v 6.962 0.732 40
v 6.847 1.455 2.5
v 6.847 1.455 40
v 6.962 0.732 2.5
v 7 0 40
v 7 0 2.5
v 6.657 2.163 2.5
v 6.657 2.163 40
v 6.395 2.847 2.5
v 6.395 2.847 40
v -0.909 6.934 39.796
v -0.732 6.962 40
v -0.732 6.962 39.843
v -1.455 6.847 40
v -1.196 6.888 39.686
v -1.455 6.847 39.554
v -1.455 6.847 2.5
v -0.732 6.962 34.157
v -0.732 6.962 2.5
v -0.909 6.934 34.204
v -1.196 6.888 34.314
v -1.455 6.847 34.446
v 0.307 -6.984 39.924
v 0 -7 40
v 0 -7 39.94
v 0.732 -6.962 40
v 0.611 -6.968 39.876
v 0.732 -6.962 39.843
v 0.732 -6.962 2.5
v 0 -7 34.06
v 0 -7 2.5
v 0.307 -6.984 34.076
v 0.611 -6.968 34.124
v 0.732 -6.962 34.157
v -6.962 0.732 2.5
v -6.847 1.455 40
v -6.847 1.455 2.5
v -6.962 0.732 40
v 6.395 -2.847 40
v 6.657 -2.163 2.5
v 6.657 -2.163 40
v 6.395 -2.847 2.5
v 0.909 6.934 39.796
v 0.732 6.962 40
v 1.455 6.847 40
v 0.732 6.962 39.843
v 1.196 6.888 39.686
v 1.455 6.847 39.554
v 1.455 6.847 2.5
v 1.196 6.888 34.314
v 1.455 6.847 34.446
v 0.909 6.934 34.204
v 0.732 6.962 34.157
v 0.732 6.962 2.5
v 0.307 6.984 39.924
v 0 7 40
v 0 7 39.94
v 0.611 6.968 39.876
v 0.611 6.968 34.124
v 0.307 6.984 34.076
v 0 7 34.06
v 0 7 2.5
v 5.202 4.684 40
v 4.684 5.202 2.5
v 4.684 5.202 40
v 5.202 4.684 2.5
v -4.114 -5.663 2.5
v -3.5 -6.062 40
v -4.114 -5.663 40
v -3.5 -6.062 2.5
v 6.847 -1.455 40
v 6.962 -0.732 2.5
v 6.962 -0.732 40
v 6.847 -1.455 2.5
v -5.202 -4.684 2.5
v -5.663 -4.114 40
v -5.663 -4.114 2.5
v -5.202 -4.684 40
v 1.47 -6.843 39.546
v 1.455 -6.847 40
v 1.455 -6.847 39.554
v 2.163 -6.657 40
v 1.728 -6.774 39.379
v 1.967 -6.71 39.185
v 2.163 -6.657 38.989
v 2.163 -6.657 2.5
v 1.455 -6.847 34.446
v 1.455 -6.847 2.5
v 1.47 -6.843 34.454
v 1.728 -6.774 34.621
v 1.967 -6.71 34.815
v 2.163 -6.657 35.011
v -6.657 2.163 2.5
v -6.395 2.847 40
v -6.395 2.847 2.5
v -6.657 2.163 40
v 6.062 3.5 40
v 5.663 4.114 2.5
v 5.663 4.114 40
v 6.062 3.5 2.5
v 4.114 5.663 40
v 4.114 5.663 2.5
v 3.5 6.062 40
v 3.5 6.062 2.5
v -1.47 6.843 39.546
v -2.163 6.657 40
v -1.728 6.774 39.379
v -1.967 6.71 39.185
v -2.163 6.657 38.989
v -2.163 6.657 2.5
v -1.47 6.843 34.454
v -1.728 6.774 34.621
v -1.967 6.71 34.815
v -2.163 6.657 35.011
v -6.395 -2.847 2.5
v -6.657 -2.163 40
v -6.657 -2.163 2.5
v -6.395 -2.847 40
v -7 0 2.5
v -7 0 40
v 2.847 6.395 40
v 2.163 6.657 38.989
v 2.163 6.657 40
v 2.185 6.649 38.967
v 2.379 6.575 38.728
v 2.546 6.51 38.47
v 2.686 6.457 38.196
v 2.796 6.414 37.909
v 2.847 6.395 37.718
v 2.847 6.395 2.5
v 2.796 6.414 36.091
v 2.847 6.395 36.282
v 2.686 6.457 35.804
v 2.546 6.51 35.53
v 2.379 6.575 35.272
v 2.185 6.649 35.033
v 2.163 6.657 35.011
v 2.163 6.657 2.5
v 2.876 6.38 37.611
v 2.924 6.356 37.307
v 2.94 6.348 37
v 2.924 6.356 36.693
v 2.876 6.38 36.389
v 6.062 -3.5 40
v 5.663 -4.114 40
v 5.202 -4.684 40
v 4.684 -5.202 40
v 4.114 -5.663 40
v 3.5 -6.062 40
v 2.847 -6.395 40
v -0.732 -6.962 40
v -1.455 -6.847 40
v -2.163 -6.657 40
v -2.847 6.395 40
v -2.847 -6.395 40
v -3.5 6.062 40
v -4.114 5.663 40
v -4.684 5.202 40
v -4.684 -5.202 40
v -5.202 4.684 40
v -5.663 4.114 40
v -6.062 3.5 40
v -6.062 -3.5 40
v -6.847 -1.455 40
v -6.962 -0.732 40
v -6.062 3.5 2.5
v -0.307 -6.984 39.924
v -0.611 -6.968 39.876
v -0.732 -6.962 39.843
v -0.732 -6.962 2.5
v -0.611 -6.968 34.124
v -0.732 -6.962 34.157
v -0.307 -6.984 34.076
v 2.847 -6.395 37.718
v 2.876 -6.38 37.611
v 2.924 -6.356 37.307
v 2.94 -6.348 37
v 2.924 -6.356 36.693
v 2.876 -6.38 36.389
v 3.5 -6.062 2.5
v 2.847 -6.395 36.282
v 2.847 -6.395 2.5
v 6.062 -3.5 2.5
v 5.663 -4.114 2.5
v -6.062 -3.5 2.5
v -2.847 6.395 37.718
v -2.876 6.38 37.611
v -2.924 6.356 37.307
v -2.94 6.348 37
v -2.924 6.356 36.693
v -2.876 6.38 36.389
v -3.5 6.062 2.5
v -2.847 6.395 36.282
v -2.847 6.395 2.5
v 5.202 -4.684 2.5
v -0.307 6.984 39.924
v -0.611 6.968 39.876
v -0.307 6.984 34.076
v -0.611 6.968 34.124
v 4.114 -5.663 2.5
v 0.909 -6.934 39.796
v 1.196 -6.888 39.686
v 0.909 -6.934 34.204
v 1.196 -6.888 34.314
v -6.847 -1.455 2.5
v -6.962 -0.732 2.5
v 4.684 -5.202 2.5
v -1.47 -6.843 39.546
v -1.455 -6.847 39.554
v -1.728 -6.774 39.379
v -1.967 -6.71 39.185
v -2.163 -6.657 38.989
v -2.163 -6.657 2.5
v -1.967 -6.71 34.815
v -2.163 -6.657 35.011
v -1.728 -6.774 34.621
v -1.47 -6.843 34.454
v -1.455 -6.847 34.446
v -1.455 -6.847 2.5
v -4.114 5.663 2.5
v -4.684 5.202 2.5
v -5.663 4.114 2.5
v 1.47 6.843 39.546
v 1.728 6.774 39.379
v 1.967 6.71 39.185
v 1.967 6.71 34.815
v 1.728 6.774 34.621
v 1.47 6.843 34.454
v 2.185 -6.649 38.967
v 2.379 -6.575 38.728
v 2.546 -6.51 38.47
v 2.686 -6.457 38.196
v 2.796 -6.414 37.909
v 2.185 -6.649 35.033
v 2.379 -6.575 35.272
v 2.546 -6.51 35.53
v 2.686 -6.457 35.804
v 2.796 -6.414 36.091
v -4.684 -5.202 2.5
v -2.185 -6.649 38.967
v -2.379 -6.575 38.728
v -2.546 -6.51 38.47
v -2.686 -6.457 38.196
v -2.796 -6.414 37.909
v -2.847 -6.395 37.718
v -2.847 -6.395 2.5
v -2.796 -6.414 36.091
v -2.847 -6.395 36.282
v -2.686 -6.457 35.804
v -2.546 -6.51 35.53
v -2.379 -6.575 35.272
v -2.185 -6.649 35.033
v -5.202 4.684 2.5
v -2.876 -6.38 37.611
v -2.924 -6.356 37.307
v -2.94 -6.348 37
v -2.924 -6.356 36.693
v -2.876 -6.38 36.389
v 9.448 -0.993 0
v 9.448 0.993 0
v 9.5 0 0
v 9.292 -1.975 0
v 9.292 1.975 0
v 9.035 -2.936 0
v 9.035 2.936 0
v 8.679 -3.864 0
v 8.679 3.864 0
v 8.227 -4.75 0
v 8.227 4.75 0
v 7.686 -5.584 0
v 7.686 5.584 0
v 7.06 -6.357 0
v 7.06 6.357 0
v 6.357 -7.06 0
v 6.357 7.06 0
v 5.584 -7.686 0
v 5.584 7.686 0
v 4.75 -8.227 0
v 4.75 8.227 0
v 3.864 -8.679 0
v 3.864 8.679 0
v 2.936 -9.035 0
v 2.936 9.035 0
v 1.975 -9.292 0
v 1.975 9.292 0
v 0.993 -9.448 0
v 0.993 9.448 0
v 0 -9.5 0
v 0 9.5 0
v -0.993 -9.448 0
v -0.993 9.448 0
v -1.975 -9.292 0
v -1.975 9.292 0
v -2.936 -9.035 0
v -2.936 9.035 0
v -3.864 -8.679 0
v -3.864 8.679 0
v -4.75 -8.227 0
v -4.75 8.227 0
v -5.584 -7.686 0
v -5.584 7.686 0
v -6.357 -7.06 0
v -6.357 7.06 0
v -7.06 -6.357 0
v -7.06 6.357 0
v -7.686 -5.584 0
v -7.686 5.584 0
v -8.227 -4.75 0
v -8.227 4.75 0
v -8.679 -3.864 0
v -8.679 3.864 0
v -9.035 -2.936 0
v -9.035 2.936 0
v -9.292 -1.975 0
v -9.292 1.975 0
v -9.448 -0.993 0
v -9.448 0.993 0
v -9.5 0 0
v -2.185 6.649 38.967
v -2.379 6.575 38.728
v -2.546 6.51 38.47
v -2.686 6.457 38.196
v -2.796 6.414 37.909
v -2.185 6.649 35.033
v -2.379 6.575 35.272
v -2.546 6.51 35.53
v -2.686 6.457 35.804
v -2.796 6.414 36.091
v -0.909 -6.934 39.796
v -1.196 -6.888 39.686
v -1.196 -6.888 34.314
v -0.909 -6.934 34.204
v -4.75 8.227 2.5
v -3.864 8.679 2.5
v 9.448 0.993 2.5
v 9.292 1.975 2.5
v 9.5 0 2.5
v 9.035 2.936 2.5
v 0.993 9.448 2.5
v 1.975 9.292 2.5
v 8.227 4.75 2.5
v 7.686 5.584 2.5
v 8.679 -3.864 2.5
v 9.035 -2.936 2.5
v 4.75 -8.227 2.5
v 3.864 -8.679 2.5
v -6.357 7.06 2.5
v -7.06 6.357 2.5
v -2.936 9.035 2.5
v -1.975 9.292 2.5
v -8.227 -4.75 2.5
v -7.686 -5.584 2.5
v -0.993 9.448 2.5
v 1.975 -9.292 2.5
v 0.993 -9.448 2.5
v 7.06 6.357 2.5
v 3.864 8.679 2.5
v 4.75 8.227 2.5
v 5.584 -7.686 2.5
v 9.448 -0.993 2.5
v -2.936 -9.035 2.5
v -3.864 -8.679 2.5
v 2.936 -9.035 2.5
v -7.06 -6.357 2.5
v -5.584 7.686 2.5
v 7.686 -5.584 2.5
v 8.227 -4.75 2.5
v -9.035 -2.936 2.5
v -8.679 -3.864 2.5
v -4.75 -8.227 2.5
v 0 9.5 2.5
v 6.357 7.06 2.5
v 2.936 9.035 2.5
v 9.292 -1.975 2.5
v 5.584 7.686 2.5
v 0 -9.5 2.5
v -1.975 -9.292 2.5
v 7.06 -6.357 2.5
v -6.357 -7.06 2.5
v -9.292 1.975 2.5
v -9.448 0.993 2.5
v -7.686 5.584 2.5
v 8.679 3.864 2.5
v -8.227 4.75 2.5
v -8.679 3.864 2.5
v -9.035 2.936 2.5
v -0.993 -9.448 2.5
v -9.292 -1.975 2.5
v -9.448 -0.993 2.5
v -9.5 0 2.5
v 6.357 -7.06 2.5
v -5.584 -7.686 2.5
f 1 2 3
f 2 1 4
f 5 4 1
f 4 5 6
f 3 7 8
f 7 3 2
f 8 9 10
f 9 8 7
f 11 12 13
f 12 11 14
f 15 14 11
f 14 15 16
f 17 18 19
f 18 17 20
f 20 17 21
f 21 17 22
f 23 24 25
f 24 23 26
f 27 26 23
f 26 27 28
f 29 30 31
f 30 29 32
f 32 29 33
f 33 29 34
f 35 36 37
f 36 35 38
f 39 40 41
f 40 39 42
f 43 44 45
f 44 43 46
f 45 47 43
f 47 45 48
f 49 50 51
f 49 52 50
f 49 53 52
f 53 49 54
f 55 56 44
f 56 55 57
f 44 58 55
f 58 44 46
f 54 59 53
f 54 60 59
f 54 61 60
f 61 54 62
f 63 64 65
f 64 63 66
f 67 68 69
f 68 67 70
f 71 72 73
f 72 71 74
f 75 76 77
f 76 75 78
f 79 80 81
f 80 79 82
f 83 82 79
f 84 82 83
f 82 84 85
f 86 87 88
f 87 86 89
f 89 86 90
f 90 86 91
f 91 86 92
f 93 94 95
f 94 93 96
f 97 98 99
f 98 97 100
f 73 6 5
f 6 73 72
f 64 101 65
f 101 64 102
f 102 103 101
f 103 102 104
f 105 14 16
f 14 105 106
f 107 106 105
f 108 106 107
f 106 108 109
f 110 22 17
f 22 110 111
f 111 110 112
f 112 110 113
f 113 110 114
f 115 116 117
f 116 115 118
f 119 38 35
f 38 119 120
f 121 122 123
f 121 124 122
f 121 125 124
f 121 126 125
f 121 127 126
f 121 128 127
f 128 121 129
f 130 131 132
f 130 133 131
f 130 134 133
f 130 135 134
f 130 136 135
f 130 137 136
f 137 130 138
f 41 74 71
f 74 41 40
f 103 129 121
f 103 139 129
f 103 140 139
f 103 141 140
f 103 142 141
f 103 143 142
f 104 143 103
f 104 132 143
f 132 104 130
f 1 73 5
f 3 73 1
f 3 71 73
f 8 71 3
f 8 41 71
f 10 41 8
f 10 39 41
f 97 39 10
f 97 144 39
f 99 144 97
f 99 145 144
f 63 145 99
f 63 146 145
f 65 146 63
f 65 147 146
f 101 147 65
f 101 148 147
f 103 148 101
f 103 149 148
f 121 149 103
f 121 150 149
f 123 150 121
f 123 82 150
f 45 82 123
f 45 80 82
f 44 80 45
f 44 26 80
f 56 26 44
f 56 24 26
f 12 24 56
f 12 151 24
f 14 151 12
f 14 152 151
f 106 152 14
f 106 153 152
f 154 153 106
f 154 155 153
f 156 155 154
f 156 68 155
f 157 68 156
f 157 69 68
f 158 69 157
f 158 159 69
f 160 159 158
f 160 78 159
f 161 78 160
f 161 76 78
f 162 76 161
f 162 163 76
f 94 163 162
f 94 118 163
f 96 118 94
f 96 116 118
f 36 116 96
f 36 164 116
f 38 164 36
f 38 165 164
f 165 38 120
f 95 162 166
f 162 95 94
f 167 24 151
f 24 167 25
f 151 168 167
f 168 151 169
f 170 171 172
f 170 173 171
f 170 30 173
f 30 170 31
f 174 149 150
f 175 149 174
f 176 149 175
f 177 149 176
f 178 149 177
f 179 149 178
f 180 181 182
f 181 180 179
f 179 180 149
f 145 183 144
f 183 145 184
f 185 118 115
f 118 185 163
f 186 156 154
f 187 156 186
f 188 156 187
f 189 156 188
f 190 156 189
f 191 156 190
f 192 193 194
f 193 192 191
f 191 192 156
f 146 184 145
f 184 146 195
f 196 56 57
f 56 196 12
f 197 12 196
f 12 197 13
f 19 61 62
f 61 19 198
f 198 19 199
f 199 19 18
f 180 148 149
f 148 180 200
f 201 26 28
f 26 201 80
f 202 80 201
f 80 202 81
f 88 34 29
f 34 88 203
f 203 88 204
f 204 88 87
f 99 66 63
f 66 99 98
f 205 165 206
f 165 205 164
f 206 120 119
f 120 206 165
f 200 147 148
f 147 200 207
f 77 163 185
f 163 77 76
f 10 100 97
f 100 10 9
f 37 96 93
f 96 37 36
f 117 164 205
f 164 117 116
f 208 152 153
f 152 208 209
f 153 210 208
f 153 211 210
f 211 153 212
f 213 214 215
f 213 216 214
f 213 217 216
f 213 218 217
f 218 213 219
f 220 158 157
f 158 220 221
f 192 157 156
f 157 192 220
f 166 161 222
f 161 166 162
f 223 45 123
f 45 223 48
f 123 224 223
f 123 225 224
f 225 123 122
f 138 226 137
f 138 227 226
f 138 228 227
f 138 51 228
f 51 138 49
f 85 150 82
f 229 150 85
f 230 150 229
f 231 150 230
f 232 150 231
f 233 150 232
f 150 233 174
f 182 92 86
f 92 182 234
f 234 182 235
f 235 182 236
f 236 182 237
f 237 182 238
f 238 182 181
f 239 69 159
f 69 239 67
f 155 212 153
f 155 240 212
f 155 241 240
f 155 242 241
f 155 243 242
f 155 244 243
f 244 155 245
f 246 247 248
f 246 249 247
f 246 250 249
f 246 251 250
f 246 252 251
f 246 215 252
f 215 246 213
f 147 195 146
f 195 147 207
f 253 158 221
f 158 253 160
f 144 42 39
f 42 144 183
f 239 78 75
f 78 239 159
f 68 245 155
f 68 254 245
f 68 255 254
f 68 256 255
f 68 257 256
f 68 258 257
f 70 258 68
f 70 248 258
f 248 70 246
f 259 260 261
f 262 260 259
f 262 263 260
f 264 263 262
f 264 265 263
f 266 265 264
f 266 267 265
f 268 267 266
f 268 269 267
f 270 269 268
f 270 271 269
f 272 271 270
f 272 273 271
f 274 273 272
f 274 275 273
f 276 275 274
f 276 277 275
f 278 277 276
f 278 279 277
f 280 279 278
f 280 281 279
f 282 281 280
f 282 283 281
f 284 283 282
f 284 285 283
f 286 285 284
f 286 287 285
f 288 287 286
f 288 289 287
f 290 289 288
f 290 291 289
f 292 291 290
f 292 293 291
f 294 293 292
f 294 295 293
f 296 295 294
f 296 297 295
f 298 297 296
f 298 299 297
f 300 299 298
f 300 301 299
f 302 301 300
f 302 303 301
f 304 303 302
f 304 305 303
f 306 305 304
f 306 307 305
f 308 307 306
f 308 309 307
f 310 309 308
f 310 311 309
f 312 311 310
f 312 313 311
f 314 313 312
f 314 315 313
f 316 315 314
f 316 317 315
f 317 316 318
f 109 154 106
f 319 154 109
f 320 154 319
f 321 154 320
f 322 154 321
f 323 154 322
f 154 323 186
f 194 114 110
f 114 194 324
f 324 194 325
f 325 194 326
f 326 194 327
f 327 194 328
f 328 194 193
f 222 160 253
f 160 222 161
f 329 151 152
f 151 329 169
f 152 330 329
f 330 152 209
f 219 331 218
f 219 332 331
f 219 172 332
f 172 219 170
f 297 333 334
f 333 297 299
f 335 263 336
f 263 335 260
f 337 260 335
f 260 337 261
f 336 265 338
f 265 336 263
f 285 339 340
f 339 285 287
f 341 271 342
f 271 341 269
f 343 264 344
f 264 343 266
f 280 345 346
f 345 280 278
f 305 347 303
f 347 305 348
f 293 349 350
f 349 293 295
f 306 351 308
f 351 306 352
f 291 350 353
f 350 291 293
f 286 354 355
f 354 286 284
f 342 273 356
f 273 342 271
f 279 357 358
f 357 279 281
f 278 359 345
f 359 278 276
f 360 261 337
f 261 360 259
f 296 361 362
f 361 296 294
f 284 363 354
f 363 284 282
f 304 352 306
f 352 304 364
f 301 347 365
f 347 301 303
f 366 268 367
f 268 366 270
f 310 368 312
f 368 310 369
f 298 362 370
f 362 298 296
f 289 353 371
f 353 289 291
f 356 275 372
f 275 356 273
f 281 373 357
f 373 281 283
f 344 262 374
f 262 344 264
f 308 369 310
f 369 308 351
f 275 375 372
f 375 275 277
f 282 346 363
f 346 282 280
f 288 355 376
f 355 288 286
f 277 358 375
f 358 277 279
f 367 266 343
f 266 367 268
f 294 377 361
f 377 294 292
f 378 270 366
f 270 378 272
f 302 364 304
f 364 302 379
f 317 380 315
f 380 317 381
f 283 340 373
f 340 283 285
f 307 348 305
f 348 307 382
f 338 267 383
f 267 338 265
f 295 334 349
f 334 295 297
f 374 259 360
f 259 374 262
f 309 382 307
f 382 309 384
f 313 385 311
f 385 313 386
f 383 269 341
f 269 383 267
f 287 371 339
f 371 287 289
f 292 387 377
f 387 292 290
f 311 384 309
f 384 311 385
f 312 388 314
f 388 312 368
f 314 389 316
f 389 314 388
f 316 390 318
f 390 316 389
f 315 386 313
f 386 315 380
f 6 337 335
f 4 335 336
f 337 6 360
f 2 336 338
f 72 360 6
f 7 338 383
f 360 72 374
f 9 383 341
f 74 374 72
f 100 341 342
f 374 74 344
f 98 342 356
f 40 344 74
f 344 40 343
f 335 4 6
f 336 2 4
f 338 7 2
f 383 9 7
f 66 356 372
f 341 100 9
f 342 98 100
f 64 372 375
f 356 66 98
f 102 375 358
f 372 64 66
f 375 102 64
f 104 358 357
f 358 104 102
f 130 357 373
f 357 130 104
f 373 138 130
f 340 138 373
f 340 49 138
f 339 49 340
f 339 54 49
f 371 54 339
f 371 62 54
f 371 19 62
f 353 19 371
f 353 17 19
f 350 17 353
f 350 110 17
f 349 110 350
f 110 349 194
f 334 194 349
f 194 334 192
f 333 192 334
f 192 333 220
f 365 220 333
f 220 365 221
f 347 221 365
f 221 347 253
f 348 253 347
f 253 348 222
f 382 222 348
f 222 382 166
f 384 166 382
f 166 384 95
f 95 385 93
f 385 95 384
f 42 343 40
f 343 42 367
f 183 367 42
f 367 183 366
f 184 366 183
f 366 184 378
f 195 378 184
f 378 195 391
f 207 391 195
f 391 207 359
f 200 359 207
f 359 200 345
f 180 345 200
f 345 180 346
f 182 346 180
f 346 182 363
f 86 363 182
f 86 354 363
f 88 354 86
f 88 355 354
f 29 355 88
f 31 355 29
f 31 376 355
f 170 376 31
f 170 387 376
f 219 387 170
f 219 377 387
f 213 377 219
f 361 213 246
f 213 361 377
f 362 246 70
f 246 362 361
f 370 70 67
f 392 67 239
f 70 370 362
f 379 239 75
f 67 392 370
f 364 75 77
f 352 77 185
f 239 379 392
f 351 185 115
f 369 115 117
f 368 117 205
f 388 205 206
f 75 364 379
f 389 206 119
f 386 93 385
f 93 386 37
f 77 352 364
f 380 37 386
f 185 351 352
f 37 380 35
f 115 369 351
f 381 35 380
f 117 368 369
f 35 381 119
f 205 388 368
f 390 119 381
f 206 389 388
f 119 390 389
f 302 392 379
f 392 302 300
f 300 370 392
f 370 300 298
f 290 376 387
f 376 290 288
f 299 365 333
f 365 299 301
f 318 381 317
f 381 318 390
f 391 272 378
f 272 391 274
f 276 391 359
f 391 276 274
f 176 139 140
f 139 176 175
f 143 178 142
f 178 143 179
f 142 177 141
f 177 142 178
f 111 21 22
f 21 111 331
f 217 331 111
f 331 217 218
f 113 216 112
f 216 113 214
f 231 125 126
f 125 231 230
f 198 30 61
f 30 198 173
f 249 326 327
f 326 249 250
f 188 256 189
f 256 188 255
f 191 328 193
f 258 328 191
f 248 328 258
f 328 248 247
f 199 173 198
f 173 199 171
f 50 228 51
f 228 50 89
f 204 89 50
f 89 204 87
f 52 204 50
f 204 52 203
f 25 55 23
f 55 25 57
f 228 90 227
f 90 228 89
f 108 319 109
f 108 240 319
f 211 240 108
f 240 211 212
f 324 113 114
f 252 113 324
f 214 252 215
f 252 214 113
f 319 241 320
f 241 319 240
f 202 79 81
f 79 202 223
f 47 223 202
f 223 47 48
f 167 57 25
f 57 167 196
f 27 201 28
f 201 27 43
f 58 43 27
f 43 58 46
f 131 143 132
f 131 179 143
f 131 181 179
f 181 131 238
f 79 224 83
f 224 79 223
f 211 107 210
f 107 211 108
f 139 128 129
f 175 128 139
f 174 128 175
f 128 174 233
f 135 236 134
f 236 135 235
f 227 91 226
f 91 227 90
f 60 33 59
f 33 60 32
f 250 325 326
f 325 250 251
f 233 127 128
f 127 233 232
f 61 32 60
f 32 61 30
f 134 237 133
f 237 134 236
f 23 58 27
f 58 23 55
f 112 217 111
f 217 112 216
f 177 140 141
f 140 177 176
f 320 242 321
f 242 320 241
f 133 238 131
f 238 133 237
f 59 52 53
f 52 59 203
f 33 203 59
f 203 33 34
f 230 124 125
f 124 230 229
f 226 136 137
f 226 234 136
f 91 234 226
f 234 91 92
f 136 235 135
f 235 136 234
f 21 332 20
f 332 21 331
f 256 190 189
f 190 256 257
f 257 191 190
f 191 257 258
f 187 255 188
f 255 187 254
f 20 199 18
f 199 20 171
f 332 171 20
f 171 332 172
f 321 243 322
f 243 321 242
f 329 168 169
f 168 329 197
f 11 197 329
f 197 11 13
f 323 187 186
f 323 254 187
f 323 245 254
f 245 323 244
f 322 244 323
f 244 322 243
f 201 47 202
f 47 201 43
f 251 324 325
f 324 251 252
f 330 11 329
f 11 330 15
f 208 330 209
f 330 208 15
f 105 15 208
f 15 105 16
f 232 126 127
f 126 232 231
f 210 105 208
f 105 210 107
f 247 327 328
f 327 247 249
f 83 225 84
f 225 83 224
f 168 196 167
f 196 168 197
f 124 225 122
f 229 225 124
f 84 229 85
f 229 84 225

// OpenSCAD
// Clevis pin with cross-hole.
$fn = 60;
eps = 0.02;
pin_d = 14;
pin_l = 40;
head_d = pin_d + 5;
difference() {
    union() { cylinder(d=pin_d,h=pin_l); cylinder(d=head_d,h=2.5); }
    translate([0,-pin_d-eps,pin_l-3]) rotate([-90,0,0]) cylinder(d=pin_d*0.42,h=2*pin_d+2*eps);
}
